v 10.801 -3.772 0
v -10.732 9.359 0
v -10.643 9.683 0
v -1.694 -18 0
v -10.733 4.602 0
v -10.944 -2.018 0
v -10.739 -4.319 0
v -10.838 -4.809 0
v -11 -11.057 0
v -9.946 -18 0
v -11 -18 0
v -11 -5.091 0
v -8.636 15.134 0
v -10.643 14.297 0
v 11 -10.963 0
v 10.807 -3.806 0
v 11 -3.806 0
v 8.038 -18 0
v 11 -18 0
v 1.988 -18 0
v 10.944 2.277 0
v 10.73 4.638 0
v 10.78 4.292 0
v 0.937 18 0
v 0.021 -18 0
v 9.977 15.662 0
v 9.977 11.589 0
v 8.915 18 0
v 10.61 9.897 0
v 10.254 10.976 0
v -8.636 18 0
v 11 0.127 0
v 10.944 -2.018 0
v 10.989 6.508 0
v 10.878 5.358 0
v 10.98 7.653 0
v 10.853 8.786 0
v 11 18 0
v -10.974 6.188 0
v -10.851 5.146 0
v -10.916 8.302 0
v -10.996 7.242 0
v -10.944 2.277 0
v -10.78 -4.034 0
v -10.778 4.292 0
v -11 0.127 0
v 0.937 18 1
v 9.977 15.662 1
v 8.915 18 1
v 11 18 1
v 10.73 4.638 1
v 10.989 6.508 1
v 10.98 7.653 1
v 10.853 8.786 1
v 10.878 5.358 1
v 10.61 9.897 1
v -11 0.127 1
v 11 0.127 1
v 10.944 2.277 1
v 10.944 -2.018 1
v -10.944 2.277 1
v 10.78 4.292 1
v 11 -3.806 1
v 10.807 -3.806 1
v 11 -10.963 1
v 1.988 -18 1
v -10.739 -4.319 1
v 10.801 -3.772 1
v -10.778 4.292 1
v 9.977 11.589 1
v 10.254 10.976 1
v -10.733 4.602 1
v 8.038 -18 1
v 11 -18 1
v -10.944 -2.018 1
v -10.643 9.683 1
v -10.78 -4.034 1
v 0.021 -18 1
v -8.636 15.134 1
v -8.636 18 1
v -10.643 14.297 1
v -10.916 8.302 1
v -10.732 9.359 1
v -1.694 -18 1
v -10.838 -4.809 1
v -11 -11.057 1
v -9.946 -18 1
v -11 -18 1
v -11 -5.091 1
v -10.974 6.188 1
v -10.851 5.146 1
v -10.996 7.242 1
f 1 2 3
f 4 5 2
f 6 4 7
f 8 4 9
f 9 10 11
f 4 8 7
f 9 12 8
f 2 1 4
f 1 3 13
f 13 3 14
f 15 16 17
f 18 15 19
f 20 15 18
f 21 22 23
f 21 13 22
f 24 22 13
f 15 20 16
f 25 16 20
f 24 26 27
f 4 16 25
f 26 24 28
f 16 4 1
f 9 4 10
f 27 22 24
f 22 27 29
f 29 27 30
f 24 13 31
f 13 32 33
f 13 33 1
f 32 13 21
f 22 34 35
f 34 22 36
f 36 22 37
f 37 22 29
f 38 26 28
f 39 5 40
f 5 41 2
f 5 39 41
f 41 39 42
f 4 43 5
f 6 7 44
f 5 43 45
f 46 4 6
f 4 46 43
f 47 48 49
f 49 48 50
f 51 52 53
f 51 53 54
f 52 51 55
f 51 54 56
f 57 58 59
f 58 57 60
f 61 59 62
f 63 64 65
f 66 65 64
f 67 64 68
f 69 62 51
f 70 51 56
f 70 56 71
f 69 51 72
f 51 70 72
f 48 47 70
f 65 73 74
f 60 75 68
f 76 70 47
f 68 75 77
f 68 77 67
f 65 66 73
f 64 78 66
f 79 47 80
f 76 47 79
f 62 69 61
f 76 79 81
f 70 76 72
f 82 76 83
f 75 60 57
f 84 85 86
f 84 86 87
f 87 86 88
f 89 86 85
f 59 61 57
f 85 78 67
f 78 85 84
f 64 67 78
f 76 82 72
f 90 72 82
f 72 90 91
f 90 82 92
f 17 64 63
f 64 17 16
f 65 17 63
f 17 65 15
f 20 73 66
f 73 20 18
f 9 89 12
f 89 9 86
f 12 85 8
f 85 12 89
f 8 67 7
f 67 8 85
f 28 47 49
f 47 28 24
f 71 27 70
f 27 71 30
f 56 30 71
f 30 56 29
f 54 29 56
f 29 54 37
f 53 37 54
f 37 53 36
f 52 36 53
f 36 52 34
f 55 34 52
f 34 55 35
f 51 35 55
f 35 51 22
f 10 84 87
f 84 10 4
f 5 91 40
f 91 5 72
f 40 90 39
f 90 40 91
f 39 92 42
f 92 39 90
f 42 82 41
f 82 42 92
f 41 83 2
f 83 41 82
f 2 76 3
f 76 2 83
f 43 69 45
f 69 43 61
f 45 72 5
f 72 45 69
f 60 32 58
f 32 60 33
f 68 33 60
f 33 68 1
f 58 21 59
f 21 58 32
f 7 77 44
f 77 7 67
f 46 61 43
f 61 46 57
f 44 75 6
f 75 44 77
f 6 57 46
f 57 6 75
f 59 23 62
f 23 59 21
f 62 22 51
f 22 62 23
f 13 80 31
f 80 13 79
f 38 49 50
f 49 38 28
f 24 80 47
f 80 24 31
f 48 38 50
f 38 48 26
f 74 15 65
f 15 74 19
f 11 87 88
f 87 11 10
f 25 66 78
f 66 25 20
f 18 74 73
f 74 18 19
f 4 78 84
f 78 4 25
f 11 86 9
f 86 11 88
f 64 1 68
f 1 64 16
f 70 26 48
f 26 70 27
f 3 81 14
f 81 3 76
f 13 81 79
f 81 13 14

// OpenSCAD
// Module names are of the form poly_<inkscape-path-id>().  As a result,
// you can associate a polygon in this OpenSCAD program with the corresponding
// SVG element in the Inkscape document by looking for the XML element with
// the attribute id="inkscape-path-id".

// fudge value is used to ensure that subtracted solids are a tad taller
// in the z dimension than the polygon being subtracted from.  This helps
// keep the resulting .stl file manifold.
fudge = 0.1;

module poly_path3598(h)
{
  scale([25.4/90, -25.4/90, 1]) union()
  {
    linear_extrude(height=h)
      polygon([[-3.715259,-16.764905],[-38.976379,63.779525],[-16.819969,63.779525],[38.976371,-63.779535],[-30.600169,-63.779535],[-30.600169,-38.814405],[5.876851,-38.814405],[-3.715259,-16.764905]]);
  }
}

module poly_path3583(h)
{
  scale([25.4/90, -25.4/90, 1]) union()
  {
    linear_extrude(height=h)
      polygon([[-38.976375,63.779535],[38.976381,63.779535],[38.976381,38.845895],[-6.154162,38.845895],[3.879691,28.518987],[13.682763,18.022693],[22.347315,8.000679],[25.968977,3.368673],[28.965606,-0.903387],[32.091850,-6.433050],[34.359155,-12.008765],[35.808629,-17.574953],[36.481380,-23.076032],[36.418516,-28.456424],[35.661145,-33.660548],[34.250375,-38.632826],[32.227314,-43.317676],[29.633069,-47.659519],[26.508748,-51.602775],[22.895460,-55.091865],[18.834312,-58.071208],[14.366412,-60.485225],[9.532869,-62.278336],[4.374789,-63.394961],[-1.066719,-63.779521],[-4.593384,-63.602371],[-8.025092,-63.082215],[-11.347660,-62.235990],[-14.546904,-61.080635],[-17.608641,-59.633089],[-20.518688,-57.910291],[-23.262861,-55.929179],[-25.826976,-53.706692],[-30.358300,-48.605346],[-33.999194,-42.741763],[-35.450271,-39.566478],[-36.636190,-36.251451],[-37.542767,-32.813618],[-38.155820,-29.269919],[-15.180270,-21.139384],[-14.856536,-24.916695],[-14.036621,-28.355233],[-12.762837,-31.404184],[-11.077494,-34.012730],[-9.022900,-36.130057],[-6.641367,-37.705348],[-3.975203,-38.687788],[-1.066719,-39.026560],[3.107856,-38.483819],[6.697786,-36.954403],[9.595372,-34.586526],[11.692917,-31.528400],[12.882722,-27.928239],[13.057090,-23.934255],[12.108323,-19.694661],[9.928723,-15.357671],[5.727223,-9.597483],[0.348739,-3.153399],[-12.677577,10.998813],[-26.627017,25.523675],[-38.976375,38.845895],[-38.976375,63.779535]]);
  }
}

module poly_path3589(h)
{
  scale([25.4/90, -25.4/90, 1]) union()
  {
    difference()
    {
       linear_extrude(height=h)
         polygon([[28.482737,63.779531],[28.482737,39.178857],[38.976378,39.178857],[38.976378,13.484820],[28.482737,13.484820],[28.482737,-63.779520],[7.945184,-63.779520],[-38.976378,18.040500],[-38.976378,39.178857],[7.045729,39.178857],[7.045729,63.779531],[28.482737,63.779531]]);
       translate([0, 0, -fudge])
         linear_extrude(height=h+2*fudge)
           polygon([[-12.442460,13.484820],[7.045729,-22.049488],[7.045729,13.484820],[-12.442460,13.484820]]);
    }
  }
}

module poly_path3592(h)
{
  scale([25.4/90, -25.4/90, 1]) union()
  {
    linear_extrude(height=h)
      polygon([[-1.564794,-39.848413],[35.352360,-39.848413],[35.352360,-63.779523],[-20.023372,-63.779523],[-34.856157,-10.659711],[-23.484355,10.370660],[-15.027607,5.090405],[-11.618127,3.461571],[-8.610368,2.393622],[-5.896174,1.801576],[-3.367390,1.600451],[1.566571,2.031029],[4.581090,2.966192],[7.388955,4.617334],[9.907116,6.884601],[12.052527,9.668136],[13.742138,12.868087],[14.892902,16.384598],[15.421771,20.117814],[15.245696,23.967882],[14.370471,27.879562],[13.002752,31.296218],[11.175371,34.181732],[8.921161,36.499988],[6.272955,38.214867],[3.263586,39.290251],[-0.074112,39.690024],[-3.707308,39.378066],[-6.616568,38.709182],[-9.089343,37.766229],[-11.199023,36.513089],[-13.019001,34.913645],[-14.622667,32.931780],[-16.083413,30.531374],[-18.869711,24.330475],[-38.976376,36.296030],[-37.245240,40.810024],[-34.799504,45.179548],[-31.681658,49.311120],[-27.934191,53.111260],[-23.599593,56.486487],[-18.720353,59.343320],[-13.338962,61.588278],[-7.497909,63.127880],[-3.108549,63.672964],[1.149721,63.757814],[5.261691,63.402348],[9.212151,62.626483],[12.985893,61.450137],[16.567706,59.893229],[19.942382,57.975675],[23.094711,55.717394],[26.009484,53.138304],[28.671491,50.258322],[31.065523,47.097367],[33.176370,43.675355],[34.988824,40.012205],[36.487674,36.127835],[37.657711,32.042162],[38.483726,27.775104],[38.917395,23.406996],[38.932444,19.089878],[38.546737,14.849244],[37.778139,10.710590],[36.644516,6.699409],[35.163732,2.841197],[33.353652,-0.838551],[31.232142,-4.314341],[28.817067,-7.560677],[26.126291,-10.552066],[23.177679,-13.263012],[19.989097,-15.668021],[16.578409,-17.741597],[12.963481,-19.458246],[9.162177,-20.792474],[5.192363,-21.718785],[2.035246,-22.098374],[-1.029166,-22.172025],[-7.003482,-21.537488],[-1.564794,-39.848413]]);
  }
}

module poly_path3595(h)
{
  scale([25.4/90, -25.4/90, 1]) union()
  {
    difference()
    {
       linear_extrude(height=h)
         polygon([[31.588904,-63.779528],[3.321803,-63.779528],[-33.616190,2.901842],[-33.963025,3.445440],[-34.830114,5.076235],[-37.314527,11.653560],[-38.675112,18.385895],[-38.942352,25.139465],[-38.146730,31.780493],[-36.318730,38.175203],[-33.488836,44.189819],[-29.687531,49.690565],[-24.945299,54.543664],[-21.650361,57.080456],[-17.510011,59.549297],[-12.979471,61.610440],[-9.698674,62.609337],[-6.372659,63.299275],[-3.021241,63.685562],[0.335765,63.773508],[6.987286,63.075607],[13.423390,61.248041],[19.485561,58.333279],[25.015286,54.373790],[27.530945,52.015544],[29.854049,49.412041],[31.964784,46.568591],[33.843336,43.490502],[35.630733,39.800202],[37.030227,36.017798],[38.048167,32.170098],[38.690905,28.283911],[38.964792,24.386045],[38.876178,20.503309],[38.431414,16.662510],[37.636850,12.890458],[36.498838,9.213960],[35.023729,5.659824],[33.217872,2.254860],[31.087619,-0.974126],[28.639320,-4.000323],[25.879327,-6.796925],[22.813989,-9.337123],[19.449658,-11.594108],[16.035495,-13.428752],[12.556301,-14.855697],[9.012074,-15.874943],[5.402816,-16.486491],[31.588904,-63.779528]]);
       translate([0, 0, -fudge])
         linear_extrude(height=h+2*fudge)
           polygon([[-7.083266,36.786126],[-9.419664,35.043143],[-11.337421,32.864858],[-12.808085,30.342577],[-13.803205,27.567607],[-14.294330,24.631257],[-14.253008,21.624834],[-13.650788,18.639645],[-12.459218,15.766998],[-10.713862,13.213927],[-8.641316,11.140751],[-6.304579,9.568705],[-3.766650,8.519023],[-1.090529,8.012939],[1.660785,8.071687],[4.424293,8.716502],[7.136994,9.968618],[9.465941,11.771056],[11.364053,13.991810],[12.806944,16.539573],[13.770225,19.323036],[14.229511,22.250892],[14.160415,25.231834],[13.538550,28.174554],[12.339528,30.987746],[9.871034,34.447521],[6.768481,36.922025],[3.243223,38.377283],[-0.493389,38.779319],[-3.376460,38.348970],[-5.869341,37.510923],[-7.083266,36.786126]]);
    }
  }
}

module poly_path3586(h)
{
  scale([25.4/90, -25.4/90, 1]) union()
  {
    linear_extrude(height=h)
      polygon([[-13.109437,-25.890694],[-12.694268,-29.355379],[-12.203146,-31.634276],[-11.371777,-33.987175],[-10.086747,-36.196300],[-8.234640,-38.043873],[-5.702042,-39.312120],[-2.375536,-39.783264],[-0.436478,-39.576764],[1.391227,-38.976998],[3.062213,-38.013568],[4.531113,-36.716073],[5.752562,-35.114114],[6.681193,-33.237292],[7.271640,-31.115208],[7.478537,-28.777462],[7.313913,-26.310389],[6.788422,-23.959604],[5.854636,-21.790652],[4.465126,-19.869077],[2.572465,-18.260423],[0.129224,-17.030234],[-2.912025,-16.244055],[-6.598710,-15.967430],[-9.062229,-15.967430],[-9.062229,4.961636],[-7.126607,4.961636],[-1.975489,5.337282],[2.408528,6.410658],[6.050191,8.101419],[8.974244,10.329221],[11.205433,13.013718],[12.768502,16.074566],[13.688198,19.431420],[13.989264,23.003936],[13.697477,26.573986],[12.842738,29.812085],[11.455978,32.673833],[9.568128,35.114829],[7.210121,37.090672],[4.412886,38.556961],[1.207357,39.469295],[-2.375536,39.783274],[-5.289279,39.536249],[-7.835968,38.821957],[-10.027977,37.680571],[-11.877678,36.152261],[-13.397443,34.277201],[-14.599646,32.095563],[-15.496658,29.647519],[-16.100852,26.973242],[-38.976379,37.076929],[-37.439773,41.850385],[-34.865933,46.577326],[-31.339403,51.075920],[-26.944732,55.164333],[-21.766463,58.660733],[-15.889143,61.383287],[-9.397319,63.150164],[-5.947388,63.618400],[-2.375536,63.779530],[2.177617,63.561446],[6.524817,62.922873],[10.653951,61.887335],[14.552904,60.478353],[18.209560,58.719450],[21.611804,56.634146],[24.747523,54.245964],[27.604601,51.578426],[30.170924,48.655054],[32.434376,45.499370],[34.382842,42.134895],[36.004209,38.585152],[37.286360,34.873663],[38.217182,31.023949],[38.784560,27.059533],[38.976378,23.003936],[38.778416,18.593440],[38.151539,14.309803],[37.046255,10.178399],[35.413074,6.224598],[33.202507,2.473773],[30.365061,-1.048704],[26.851249,-4.317461],[22.611578,-7.307127],[25.467582,-9.613510],[27.742074,-12.057326],[29.496919,-14.623772],[30.793978,-17.298049],[31.695114,-20.065357],[32.262190,-22.910896],[32.641616,-28.777462],[32.462944,-32.292494],[31.938098,-35.720575],[31.083831,-39.042410],[29.916899,-42.238708],[28.454056,-45.290173],[26.712057,-48.177513],[24.707656,-50.881435],[22.457608,-53.382646],[19.978667,-55.661851],[17.287588,-57.699759],[14.401125,-59.477075],[11.336033,-60.974507],[8.109066,-62.172760],[4.736979,-63.052542],[1.236527,-63.594560],[-2.375536,-63.779520],[-6.066303,-63.604735],[-9.548540,-63.091658],[-12.819927,-62.257201],[-15.878146,-61.118281],[-18.720875,-59.691812],[-21.345795,-57.994708],[-23.750587,-56.043885],[-25.932929,-53.856256],[-27.890504,-51.448737],[-29.620989,-48.838242],[-32.391416,-43.075983],[-34.225652,-36.704796],[-35.105136,-29.860000],[-13.109437,-25.890694]]);
  }
}

module poly_path3601(h)
{
  scale([25.4/90, -25.4/90, 1]) union()
  {
    difference()
    {
       linear_extrude(height=h)
         polygon([[26.755145,-3.345370],[28.621114,-5.891974],[30.238287,-8.573797],[31.836874,-11.992936],[33.090694,-15.475194],[34.004849,-18.999179],[34.584441,-22.543501],[34.834573,-26.086765],[34.760347,-29.607582],[34.366866,-33.084558],[33.659231,-36.496302],[32.642545,-39.821422],[31.321910,-43.038527],[29.702429,-46.126223],[27.789203,-49.063120],[25.587334,-51.827825],[23.101926,-54.398947],[20.338081,-56.755093],[17.300900,-58.874872],[14.164184,-60.606648],[10.929068,-61.953897],[7.621548,-62.925072],[4.267622,-63.528623],[0.893287,-63.773001],[-2.475460,-63.666658],[-5.812621,-63.218044],[-9.092200,-62.435611],[-12.288199,-61.327810],[-15.374621,-59.903092],[-18.325468,-58.169907],[-21.114744,-56.136709],[-23.716452,-53.811946],[-26.104593,-51.204071],[-28.253171,-48.321534],[-30.136188,-45.172787],[-32.503313,-39.803860],[-34.021032,-34.301828],[-34.710728,-28.753314],[-34.593781,-23.244944],[-33.691572,-17.863340],[-32.025482,-12.695127],[-29.616891,-7.826929],[-26.487181,-3.345370],[-30.426450,0.688632],[-33.619331,5.128288],[-35.470803,8.789913],[-36.924299,12.524428],[-37.986136,16.307537],[-38.662631,20.114944],[-38.960101,23.922350],[-38.884863,27.705459],[-38.443234,31.439975],[-37.641531,35.101599],[-36.486072,38.666036],[-34.983173,42.108987],[-33.139151,45.406157],[-30.960324,48.533248],[-28.453009,51.465964],[-25.623522,54.180006],[-22.478182,56.651079],[-19.023304,58.854885],[-15.540930,60.588509],[-11.954325,61.940248],[-8.291429,62.916969],[-4.580183,63.525538],[-0.848527,63.772821],[2.875596,63.665686],[6.564247,63.210998],[10.189483,62.415624],[13.723365,61.286431],[17.137951,59.830285],[20.405301,58.054053],[23.497473,55.964601],[26.386526,53.568796],[29.044520,50.873505],[31.443514,47.885593],[33.555566,44.611928],[36.508398,38.343661],[38.300830,31.921160],[38.969793,25.460630],[38.552217,19.078273],[37.085034,12.890291],[34.605174,7.012888],[31.149567,1.562267],[26.755145,-3.345370]]);
       translate([0, 0, -fudge])
         linear_extrude(height=h+2*fudge)
           polygon([[-9.569059,-33.273608],[-8.144962,-35.486745],[-6.510943,-37.254086],[-4.705876,-38.569292],[-2.768637,-39.426024],[-0.738100,-39.817945],[1.346862,-39.738716],[3.447373,-39.181998],[5.524560,-38.141454],[7.355866,-36.701946],[8.854797,-34.873687],[9.999971,-32.741187],[10.770007,-30.388958],[11.143525,-27.901512],[11.099143,-25.363358],[10.615481,-22.859009],[9.671158,-20.472976],[7.893304,-17.760166],[5.773356,-15.807957],[3.280213,-14.565642],[0.382778,-13.982514],[-2.893035,-14.523386],[-5.422460,-15.605130],[-7.253767,-17.103795],[-8.752697,-18.974310],[-9.897871,-21.132163],[-10.667908,-23.492843],[-11.041425,-25.971839],[-10.997044,-28.484639],[-10.513382,-30.946732],[-9.569059,-33.273608]]);
       translate([0, 0, -fudge])
         linear_extrude(height=h+2*fudge)
           polygon([[13.486029,31.991586],[11.641117,34.591011],[9.393855,36.696044],[6.823935,38.285559],[4.011051,39.338428],[1.034895,39.833523],[-2.024841,39.749716],[-5.088465,39.065879],[-8.076283,37.760885],[-10.468029,36.043195],[-12.406887,33.924076],[-13.875366,31.492266],[-14.855972,28.836501],[-15.331211,26.045518],[-15.283590,23.208054],[-14.695615,20.412846],[-13.549794,17.748630],[-11.051468,14.455509],[-7.993352,12.092012],[-4.313245,10.573628],[0.051050,9.815844],[4.404978,10.514470],[8.012519,12.159621],[10.458688,13.869565],[12.436421,15.968260],[13.928225,18.371196],[14.916606,20.993860],[15.384070,23.751743],[15.313124,26.560332],[14.686275,29.335117],[13.486029,31.991586]]);
    }
  }
}

module poly_path3580(h)
{
  scale([25.4/90, -25.4/90, 1]) union()
  {
    linear_extrude(height=h)
      polygon([[-38.976378,63.779526],[38.976378,63.779526],[38.976378,39.543305],[12.570108,39.543305],[12.570108,-63.779532],[-6.239838,-63.779532],[-37.710324,-50.659171],[-37.710324,-21.138360],[-13.112703,-33.894266],[-13.112703,39.543305],[-38.976378,39.543305],[-38.976378,63.779526]]);
  }
}

module poly_path3604(h)
{
  scale([25.4/90, -25.4/90, 1]) union()
  {
    difference()
    {
       linear_extrude(height=h)
         polygon([[34.358134,-6.463361],[34.716898,-7.006476],[36.439859,-10.928105],[37.712437,-14.932209],[38.542517,-18.986700],[38.937981,-23.059489],[38.906712,-27.118488],[38.456593,-31.131608],[37.595506,-35.066762],[36.331336,-38.891861],[34.671965,-42.574817],[32.625275,-46.083540],[30.199151,-49.385944],[27.401475,-52.449939],[24.240129,-55.243437],[20.722998,-57.734350],[16.857963,-59.890590],[12.652909,-61.680068],[9.364209,-62.648376],[6.036094,-63.316485],[-0.660601,-63.773324],[-7.281620,-63.093016],[-13.671404,-61.317991],[-19.674395,-58.490681],[-25.135036,-54.653515],[-27.613364,-52.369497],[-29.897769,-49.848926],[-31.968808,-47.097108],[-33.807036,-44.119345],[-35.596915,-40.540212],[-37.001578,-36.879931],[-38.026806,-33.163428],[-38.678379,-29.415633],[-38.962080,-25.661474],[-38.883688,-21.925877],[-38.448984,-18.233773],[-37.663750,-14.610088],[-36.533765,-11.079751],[-35.064812,-7.667690],[-33.262671,-4.398834],[-31.133123,-1.298109],[-28.681948,1.609555],[-25.914928,4.299230],[-22.837843,6.745988],[-19.456474,8.924902],[-13.133258,11.889406],[-9.870747,12.921890],[-6.540968,13.631900],[-35.242092,63.779532],[-6.002822,63.779532],[33.102460,-4.109862],[33.819988,-5.377130],[34.358134,-6.463361]]);
       translate([0, 0, -fudge])
         linear_extrude(height=h+2*fudge)
           polygon([[6.733302,-36.877809],[8.730679,-35.351359],[10.402225,-33.525770],[11.724817,-31.458326],[12.675331,-29.206308],[13.230645,-26.826997],[13.367634,-24.377674],[13.063175,-21.915623],[12.294145,-19.498124],[10.500324,-16.058395],[8.818618,-14.210177],[6.901472,-12.745958],[4.799339,-11.676347],[2.562670,-11.011950],[0.241915,-10.763376],[-2.112474,-10.941232],[-4.450046,-11.556126],[-6.720350,-12.618666],[-8.885547,-14.208055],[-10.655543,-16.202660],[-12.005113,-18.515496],[-12.909030,-21.059580],[-13.342069,-23.747930],[-13.279005,-26.493561],[-12.694612,-29.209490],[-11.563665,-31.808734],[-9.369038,-34.716663],[-6.653082,-36.877809],[-3.567150,-38.224282],[-0.262597,-38.688193],[3.257775,-38.280857],[6.374538,-37.058848],[6.733302,-36.877809]]);
    }
  }
}

module poly_path3607(h)
{
  scale([25.4/90, -25.4/90, 1]) union()
  {
    difference()
    {
       linear_extrude(height=h)
         polygon([[0.075386,63.779533],[4.090320,63.516777],[7.980684,62.731674],[11.727925,61.428966],[15.313492,59.613398],[18.718830,57.289713],[21.925387,54.462656],[24.914611,51.136969],[27.667948,47.317398],[30.166845,43.008685],[32.392750,38.215575],[34.327109,32.942811],[35.951371,27.195137],[37.246981,20.977297],[38.195387,14.294035],[38.778036,7.150095],[38.976375,-0.449780],[38.778036,-8.069201],[38.195387,-15.206597],[37.246981,-21.860649],[35.951371,-28.030040],[34.327109,-33.713453],[32.392750,-38.909569],[30.166845,-43.617071],[27.667948,-47.834641],[24.914611,-51.560961],[21.925387,-54.794714],[18.718830,-57.534581],[15.313492,-59.779246],[11.727925,-61.527391],[7.980684,-62.777696],[4.090320,-63.528846],[0.075386,-63.779523],[-3.941240,-63.528846],[-7.836390,-62.777696],[-11.591067,-61.527391],[-15.186278,-59.779246],[-18.603028,-57.534581],[-21.822322,-54.794714],[-24.825166,-51.560961],[-27.592565,-47.834641],[-30.105524,-43.617071],[-32.345049,-38.909569],[-34.292145,-33.713453],[-35.927818,-28.030040],[-37.233072,-21.860649],[-38.188914,-15.206597],[-38.776349,-8.069201],[-38.976381,-0.449780],[-38.778005,7.150095],[-38.195098,14.294035],[-37.245993,20.977297],[-35.949021,27.195137],[-34.322514,32.942811],[-32.384805,38.215575],[-30.154225,43.008685],[-27.649107,47.317398],[-24.887782,51.136969],[-21.888582,54.462656],[-18.669840,57.289713],[-15.249888,59.613398],[-11.647057,61.428966],[-7.879680,62.731674],[-3.966088,63.516777],[0.075386,63.779533]]);
       translate([0, 0, -fudge])
         linear_extrude(height=h+2*fudge)
           polygon([[0.075386,40.210793],[-3.100397,39.651724],[-6.219638,37.930945],[-9.169253,34.983096],[-11.836157,30.742817],[-14.107266,25.144749],[-15.869496,18.123533],[-17.009762,9.613810],[-17.414981,-0.449780],[-17.022131,-10.415331],[-15.911902,-18.778523],[-14.186778,-25.623690],[-11.949241,-31.035167],[-9.301773,-35.097289],[-6.346858,-37.894390],[-3.186977,-39.510805],[0.075386,-40.030869],[3.287981,-39.510805],[6.410461,-37.894390],[9.338578,-35.097289],[11.968082,-31.035167],[14.194723,-25.623690],[15.914252,-18.778523],[17.022419,-10.415331],[17.414974,-0.449780],[17.010050,9.613810],[15.871845,18.123533],[14.115211,25.144749],[11.854998,30.742817],[9.206058,34.983096],[6.283242,37.930945],[3.201401,39.651724],[0.075386,40.210793]]);
    }
  }
}

poly_path3598(1);
poly_path3583(1);
poly_path3589(1);
poly_path3592(1);
poly_path3595(1);
poly_path3586(1);
poly_path3601(1);
poly_path3580(1);
poly_path3604(1);
poly_path3607(1);
